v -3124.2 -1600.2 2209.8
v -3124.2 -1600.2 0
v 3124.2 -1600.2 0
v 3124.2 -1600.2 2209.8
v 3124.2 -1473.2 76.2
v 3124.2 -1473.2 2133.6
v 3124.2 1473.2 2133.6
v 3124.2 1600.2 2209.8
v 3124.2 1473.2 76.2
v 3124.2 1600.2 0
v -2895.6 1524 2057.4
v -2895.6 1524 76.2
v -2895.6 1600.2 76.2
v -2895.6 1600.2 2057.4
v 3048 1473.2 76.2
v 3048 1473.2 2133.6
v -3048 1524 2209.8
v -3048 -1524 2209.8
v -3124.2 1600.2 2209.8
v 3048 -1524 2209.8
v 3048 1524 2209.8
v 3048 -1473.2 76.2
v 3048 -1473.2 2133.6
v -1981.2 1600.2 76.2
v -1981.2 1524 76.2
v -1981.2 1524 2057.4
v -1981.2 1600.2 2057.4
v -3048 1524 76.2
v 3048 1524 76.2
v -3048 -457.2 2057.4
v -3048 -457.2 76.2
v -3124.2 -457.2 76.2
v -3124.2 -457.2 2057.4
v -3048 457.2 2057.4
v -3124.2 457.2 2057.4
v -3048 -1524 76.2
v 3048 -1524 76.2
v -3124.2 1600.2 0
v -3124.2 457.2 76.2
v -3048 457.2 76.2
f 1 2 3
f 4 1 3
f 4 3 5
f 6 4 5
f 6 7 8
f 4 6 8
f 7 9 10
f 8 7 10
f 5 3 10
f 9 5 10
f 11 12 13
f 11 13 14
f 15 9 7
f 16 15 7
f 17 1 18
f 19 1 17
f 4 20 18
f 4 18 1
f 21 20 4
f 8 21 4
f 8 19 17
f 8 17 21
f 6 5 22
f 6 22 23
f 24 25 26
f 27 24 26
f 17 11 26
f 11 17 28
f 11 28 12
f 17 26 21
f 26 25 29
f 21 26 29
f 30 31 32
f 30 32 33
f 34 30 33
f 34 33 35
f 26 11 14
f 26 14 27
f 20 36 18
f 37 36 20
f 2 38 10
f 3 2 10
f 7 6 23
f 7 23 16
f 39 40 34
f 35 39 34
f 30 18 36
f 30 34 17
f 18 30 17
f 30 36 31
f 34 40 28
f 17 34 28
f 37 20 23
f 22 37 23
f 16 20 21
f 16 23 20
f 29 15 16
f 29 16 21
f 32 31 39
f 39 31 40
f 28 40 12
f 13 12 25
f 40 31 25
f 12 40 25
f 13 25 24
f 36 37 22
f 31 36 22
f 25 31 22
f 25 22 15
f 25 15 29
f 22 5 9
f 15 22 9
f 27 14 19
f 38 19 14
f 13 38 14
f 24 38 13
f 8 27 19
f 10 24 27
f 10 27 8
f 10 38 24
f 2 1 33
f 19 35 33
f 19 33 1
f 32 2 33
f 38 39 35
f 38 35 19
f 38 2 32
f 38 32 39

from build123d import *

# Parameters (mm, degrees)
F0_W     = 6248.4
F0_H     = 3200.4
F1_DEPTH = 2209.8
F2_T     = -76.2
F3_W     = 914.4
F3_H     = 1981.2
F4_DEPTH = 76.2
F5_W     = 2946.4
F5_H     = 2057.4
F6_DEPTH = 76.2
F7_W     = 914.4
F7_H     = 1981.2
F8_DEPTH = 76.2


with BuildPart() as f1:
    # F0 (on Top) → F1 (new body)
    with BuildSketch(Plane.XY):
        Rectangle(F0_W, F0_H)
    extrude(amount=F1_DEPTH)

    # F2
    f2_openings = [f1.faces().sort_by_distance(p)[0] for p in [
        (0, 0, 2209.8),
    ]]
    offset(amount=F2_T, openings=f2_openings)

    # F3 (on face) → F4 (cut, through all)
    with BuildSketch(Plane.YZ.offset(-3048)):
        with Locations((0, 1066.8)):
            Rectangle(F3_W, F3_H)
    extrude(amount=-F4_DEPTH, mode=Mode.SUBTRACT)

    # F5 (on face) → F6 (cut, through all)
    with BuildSketch(Plane.YZ.offset(3124.2)):
        with Locations((0, 1104.9)):
            Rectangle(F5_W, F5_H)
    extrude(amount=-F6_DEPTH, mode=Mode.SUBTRACT)

    # F7 (on face) → F8 (cut, through all)
    with BuildSketch(Plane.XZ.offset(-1524)):
        with Locations((-2438.4, 1066.8)):
            Rectangle(F7_W, F7_H)
    extrude(amount=-F8_DEPTH, mode=Mode.SUBTRACT)


solid = f1.part
